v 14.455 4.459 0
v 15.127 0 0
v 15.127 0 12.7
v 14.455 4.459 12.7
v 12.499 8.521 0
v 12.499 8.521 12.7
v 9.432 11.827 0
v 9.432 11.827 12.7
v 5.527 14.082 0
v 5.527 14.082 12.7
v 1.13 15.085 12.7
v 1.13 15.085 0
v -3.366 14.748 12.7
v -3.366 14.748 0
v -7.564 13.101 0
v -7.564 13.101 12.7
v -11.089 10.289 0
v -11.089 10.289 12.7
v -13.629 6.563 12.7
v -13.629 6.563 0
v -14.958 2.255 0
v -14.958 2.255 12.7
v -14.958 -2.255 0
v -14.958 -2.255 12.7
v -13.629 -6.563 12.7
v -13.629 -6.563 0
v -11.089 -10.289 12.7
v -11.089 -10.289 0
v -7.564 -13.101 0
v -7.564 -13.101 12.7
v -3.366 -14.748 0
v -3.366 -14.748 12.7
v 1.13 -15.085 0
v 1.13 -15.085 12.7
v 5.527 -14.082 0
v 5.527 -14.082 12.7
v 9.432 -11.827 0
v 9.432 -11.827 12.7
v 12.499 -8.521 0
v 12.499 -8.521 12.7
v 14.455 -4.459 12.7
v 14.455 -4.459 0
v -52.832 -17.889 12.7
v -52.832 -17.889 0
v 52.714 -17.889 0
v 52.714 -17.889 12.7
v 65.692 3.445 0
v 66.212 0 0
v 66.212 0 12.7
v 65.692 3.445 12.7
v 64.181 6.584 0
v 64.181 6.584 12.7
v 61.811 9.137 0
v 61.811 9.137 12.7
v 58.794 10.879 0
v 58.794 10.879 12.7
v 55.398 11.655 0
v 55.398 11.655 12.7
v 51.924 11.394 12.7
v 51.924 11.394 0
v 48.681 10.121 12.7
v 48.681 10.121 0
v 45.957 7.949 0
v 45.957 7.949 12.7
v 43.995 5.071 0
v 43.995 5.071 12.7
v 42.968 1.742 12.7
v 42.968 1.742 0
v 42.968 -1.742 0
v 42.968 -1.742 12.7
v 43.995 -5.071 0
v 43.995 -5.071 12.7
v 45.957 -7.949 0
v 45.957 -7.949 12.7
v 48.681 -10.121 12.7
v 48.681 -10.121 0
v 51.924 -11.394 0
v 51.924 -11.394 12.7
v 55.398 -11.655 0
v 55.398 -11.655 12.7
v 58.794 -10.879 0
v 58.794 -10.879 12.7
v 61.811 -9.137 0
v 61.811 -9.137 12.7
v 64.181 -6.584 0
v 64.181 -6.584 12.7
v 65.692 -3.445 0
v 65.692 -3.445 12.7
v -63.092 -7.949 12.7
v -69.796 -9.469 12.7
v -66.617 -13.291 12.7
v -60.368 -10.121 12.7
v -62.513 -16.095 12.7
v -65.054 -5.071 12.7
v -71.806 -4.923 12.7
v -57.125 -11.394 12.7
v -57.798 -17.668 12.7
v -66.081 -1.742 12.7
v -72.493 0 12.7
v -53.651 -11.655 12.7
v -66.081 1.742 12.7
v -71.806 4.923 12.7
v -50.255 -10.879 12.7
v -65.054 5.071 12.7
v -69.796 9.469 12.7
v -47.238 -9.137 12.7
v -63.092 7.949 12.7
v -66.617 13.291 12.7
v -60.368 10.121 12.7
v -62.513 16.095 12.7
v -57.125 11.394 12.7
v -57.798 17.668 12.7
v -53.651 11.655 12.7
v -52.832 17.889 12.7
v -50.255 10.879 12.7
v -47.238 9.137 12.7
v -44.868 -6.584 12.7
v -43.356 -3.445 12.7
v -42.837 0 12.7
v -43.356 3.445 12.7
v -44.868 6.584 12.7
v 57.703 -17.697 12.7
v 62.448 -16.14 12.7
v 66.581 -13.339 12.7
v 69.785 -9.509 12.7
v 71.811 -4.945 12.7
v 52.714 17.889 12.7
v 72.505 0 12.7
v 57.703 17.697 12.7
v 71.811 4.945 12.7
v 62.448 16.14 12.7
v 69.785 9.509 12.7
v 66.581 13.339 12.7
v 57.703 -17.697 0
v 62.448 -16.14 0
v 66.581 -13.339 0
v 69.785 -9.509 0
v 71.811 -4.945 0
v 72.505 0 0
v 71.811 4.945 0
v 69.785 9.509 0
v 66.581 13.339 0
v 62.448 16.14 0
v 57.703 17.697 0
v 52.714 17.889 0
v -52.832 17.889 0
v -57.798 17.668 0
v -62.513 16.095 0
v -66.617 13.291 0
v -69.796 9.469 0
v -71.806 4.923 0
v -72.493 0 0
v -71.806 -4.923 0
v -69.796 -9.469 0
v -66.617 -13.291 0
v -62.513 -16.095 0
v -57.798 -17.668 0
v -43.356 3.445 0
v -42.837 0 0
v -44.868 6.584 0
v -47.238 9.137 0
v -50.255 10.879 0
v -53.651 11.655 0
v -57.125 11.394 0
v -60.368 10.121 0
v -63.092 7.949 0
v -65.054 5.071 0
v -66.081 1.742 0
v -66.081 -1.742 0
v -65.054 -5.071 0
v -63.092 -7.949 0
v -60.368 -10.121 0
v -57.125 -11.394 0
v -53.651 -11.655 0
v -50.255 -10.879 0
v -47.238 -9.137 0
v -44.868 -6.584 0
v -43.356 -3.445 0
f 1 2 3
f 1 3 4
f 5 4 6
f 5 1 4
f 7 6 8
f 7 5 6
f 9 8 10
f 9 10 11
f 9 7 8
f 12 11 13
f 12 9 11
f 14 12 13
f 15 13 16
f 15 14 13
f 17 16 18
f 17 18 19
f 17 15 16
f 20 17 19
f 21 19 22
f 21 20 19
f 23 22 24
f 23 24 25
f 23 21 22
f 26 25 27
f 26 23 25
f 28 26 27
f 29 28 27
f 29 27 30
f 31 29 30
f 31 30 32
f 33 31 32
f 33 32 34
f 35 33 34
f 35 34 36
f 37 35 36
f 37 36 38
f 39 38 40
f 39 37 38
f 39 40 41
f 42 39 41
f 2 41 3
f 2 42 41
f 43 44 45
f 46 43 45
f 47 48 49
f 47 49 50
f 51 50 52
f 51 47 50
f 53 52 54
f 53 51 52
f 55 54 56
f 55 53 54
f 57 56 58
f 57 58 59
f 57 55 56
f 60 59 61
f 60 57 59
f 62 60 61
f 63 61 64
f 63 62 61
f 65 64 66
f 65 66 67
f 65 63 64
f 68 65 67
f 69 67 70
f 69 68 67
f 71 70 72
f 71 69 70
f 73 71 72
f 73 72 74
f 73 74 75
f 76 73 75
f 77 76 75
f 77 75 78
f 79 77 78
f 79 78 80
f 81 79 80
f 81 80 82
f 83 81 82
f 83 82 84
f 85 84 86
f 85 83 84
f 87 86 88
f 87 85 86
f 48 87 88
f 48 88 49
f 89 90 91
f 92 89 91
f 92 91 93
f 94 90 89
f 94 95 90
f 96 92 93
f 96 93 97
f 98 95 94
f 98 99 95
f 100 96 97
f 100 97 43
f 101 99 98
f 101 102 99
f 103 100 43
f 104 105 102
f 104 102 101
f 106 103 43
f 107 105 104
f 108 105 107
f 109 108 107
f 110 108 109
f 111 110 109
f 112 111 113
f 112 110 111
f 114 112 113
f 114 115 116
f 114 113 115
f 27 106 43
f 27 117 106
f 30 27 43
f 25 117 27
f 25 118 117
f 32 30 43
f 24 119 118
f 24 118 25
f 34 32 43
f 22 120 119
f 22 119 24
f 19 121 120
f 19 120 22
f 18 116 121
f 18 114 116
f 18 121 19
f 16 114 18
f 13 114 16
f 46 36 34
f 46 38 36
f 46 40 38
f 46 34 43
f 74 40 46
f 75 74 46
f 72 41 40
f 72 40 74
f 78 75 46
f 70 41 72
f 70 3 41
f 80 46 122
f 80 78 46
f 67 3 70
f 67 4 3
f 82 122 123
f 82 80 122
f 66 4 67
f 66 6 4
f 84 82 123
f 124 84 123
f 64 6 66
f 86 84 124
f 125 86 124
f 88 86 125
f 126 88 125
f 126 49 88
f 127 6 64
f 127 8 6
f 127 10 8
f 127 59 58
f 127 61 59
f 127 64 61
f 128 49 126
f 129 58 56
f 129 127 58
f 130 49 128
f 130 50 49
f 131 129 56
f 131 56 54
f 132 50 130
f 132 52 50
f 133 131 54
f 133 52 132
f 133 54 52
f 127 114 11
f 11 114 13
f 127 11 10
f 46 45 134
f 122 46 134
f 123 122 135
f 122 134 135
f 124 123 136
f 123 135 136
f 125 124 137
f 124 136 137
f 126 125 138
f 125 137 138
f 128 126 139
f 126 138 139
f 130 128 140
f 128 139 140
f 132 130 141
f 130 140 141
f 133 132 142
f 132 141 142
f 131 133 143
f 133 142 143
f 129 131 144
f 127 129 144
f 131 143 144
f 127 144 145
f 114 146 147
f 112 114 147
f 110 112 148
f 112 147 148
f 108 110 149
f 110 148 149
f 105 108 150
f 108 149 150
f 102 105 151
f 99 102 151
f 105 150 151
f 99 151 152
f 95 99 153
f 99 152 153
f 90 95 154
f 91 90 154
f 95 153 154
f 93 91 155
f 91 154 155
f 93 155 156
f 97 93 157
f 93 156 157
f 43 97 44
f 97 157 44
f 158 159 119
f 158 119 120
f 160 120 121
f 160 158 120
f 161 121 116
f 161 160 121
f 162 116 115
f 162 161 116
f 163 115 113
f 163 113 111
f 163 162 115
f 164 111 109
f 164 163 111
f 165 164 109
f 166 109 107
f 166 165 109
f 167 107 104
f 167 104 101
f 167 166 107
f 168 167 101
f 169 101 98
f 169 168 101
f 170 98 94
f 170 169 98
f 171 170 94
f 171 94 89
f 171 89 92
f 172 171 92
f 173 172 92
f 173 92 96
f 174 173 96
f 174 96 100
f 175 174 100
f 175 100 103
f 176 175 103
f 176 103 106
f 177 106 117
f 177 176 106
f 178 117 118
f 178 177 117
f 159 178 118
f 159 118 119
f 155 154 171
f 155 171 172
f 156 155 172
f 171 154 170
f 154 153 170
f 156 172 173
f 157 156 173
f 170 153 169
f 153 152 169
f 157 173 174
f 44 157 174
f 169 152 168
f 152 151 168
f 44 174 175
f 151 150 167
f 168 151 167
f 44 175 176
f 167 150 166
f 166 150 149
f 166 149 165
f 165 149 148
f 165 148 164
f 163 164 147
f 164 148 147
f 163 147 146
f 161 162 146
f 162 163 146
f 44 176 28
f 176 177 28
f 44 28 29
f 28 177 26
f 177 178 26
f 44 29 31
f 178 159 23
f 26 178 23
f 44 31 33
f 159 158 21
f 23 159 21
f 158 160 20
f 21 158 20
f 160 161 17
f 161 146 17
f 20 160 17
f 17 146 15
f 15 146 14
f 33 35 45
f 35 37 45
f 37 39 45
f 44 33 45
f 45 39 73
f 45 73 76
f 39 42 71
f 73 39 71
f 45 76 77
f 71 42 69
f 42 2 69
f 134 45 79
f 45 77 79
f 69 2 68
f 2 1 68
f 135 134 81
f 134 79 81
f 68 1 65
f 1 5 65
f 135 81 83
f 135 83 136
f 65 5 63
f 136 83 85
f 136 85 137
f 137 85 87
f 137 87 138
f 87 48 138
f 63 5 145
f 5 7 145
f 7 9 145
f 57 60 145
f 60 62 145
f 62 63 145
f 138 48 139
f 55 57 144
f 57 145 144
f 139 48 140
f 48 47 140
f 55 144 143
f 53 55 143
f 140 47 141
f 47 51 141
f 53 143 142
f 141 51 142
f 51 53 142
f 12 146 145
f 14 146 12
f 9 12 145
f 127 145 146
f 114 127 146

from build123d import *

# Parameters (mm, degrees)
F0_R     = 11.687263
F0_R_2   = 15.127238
F1_DEPTH = 12.7


with BuildPart() as f1:
    # F0 (on Top) → F1 (new body)
    with BuildSketch(Plane.XY):
        with BuildLine():
            Line((52.713767, 17.888913), (54.524425, 17.888913))
            ThreePointArc((54.524425, 17.888913), (72.413338, 0), (54.524425, -17.888913))
            Line((54.524425, -17.888913), (52.713767, -17.888913))
            ThreePointArc((52.713767, -17.888913), (72.504739, 0), (52.713767, 17.888913))
        make_face()
        with BuildLine():
            Line((-54.524425, 17.888913), (-52.831878, 17.888913))
            ThreePointArc((-52.831878, 17.888913), (-72.49323, 0), (-52.831878, -17.888913))
            Line((-52.831878, -17.888913), (-54.524425, -17.888913))
            ThreePointArc((-54.524425, -17.888913), (-72.413338, 0), (-54.524425, 17.888913))
        make_face()
        with BuildLine():
            ThreePointArc((54.524425, -17.888913), (72.413338, 0), (54.524425, 17.888913))
            Line((54.524425, 17.888913), (52.713767, 17.888913))
            Line((52.713767, 17.888913), (-52.831878, 17.888913))
            Line((-52.831878, 17.888913), (-54.524425, 17.888913))
            ThreePointArc((-54.524425, 17.888913), (-72.413338, 0), (-54.524425, -17.888913))
            Line((-54.524425, -17.888913), (-52.831878, -17.888913))
            Line((-52.831878, -17.888913), (52.713767, -17.888913))
            Line((52.713767, -17.888913), (54.524425, -17.888913))
        make_face()
        with Locations((-54.524425, 0)):
            Circle(F0_R, mode=Mode.SUBTRACT)
        Circle(F0_R_2, mode=Mode.SUBTRACT)
        with Locations((54.524425, 0)):
            Circle(F0_R, mode=Mode.SUBTRACT)
    extrude(amount=F1_DEPTH)


solid = f1.part
